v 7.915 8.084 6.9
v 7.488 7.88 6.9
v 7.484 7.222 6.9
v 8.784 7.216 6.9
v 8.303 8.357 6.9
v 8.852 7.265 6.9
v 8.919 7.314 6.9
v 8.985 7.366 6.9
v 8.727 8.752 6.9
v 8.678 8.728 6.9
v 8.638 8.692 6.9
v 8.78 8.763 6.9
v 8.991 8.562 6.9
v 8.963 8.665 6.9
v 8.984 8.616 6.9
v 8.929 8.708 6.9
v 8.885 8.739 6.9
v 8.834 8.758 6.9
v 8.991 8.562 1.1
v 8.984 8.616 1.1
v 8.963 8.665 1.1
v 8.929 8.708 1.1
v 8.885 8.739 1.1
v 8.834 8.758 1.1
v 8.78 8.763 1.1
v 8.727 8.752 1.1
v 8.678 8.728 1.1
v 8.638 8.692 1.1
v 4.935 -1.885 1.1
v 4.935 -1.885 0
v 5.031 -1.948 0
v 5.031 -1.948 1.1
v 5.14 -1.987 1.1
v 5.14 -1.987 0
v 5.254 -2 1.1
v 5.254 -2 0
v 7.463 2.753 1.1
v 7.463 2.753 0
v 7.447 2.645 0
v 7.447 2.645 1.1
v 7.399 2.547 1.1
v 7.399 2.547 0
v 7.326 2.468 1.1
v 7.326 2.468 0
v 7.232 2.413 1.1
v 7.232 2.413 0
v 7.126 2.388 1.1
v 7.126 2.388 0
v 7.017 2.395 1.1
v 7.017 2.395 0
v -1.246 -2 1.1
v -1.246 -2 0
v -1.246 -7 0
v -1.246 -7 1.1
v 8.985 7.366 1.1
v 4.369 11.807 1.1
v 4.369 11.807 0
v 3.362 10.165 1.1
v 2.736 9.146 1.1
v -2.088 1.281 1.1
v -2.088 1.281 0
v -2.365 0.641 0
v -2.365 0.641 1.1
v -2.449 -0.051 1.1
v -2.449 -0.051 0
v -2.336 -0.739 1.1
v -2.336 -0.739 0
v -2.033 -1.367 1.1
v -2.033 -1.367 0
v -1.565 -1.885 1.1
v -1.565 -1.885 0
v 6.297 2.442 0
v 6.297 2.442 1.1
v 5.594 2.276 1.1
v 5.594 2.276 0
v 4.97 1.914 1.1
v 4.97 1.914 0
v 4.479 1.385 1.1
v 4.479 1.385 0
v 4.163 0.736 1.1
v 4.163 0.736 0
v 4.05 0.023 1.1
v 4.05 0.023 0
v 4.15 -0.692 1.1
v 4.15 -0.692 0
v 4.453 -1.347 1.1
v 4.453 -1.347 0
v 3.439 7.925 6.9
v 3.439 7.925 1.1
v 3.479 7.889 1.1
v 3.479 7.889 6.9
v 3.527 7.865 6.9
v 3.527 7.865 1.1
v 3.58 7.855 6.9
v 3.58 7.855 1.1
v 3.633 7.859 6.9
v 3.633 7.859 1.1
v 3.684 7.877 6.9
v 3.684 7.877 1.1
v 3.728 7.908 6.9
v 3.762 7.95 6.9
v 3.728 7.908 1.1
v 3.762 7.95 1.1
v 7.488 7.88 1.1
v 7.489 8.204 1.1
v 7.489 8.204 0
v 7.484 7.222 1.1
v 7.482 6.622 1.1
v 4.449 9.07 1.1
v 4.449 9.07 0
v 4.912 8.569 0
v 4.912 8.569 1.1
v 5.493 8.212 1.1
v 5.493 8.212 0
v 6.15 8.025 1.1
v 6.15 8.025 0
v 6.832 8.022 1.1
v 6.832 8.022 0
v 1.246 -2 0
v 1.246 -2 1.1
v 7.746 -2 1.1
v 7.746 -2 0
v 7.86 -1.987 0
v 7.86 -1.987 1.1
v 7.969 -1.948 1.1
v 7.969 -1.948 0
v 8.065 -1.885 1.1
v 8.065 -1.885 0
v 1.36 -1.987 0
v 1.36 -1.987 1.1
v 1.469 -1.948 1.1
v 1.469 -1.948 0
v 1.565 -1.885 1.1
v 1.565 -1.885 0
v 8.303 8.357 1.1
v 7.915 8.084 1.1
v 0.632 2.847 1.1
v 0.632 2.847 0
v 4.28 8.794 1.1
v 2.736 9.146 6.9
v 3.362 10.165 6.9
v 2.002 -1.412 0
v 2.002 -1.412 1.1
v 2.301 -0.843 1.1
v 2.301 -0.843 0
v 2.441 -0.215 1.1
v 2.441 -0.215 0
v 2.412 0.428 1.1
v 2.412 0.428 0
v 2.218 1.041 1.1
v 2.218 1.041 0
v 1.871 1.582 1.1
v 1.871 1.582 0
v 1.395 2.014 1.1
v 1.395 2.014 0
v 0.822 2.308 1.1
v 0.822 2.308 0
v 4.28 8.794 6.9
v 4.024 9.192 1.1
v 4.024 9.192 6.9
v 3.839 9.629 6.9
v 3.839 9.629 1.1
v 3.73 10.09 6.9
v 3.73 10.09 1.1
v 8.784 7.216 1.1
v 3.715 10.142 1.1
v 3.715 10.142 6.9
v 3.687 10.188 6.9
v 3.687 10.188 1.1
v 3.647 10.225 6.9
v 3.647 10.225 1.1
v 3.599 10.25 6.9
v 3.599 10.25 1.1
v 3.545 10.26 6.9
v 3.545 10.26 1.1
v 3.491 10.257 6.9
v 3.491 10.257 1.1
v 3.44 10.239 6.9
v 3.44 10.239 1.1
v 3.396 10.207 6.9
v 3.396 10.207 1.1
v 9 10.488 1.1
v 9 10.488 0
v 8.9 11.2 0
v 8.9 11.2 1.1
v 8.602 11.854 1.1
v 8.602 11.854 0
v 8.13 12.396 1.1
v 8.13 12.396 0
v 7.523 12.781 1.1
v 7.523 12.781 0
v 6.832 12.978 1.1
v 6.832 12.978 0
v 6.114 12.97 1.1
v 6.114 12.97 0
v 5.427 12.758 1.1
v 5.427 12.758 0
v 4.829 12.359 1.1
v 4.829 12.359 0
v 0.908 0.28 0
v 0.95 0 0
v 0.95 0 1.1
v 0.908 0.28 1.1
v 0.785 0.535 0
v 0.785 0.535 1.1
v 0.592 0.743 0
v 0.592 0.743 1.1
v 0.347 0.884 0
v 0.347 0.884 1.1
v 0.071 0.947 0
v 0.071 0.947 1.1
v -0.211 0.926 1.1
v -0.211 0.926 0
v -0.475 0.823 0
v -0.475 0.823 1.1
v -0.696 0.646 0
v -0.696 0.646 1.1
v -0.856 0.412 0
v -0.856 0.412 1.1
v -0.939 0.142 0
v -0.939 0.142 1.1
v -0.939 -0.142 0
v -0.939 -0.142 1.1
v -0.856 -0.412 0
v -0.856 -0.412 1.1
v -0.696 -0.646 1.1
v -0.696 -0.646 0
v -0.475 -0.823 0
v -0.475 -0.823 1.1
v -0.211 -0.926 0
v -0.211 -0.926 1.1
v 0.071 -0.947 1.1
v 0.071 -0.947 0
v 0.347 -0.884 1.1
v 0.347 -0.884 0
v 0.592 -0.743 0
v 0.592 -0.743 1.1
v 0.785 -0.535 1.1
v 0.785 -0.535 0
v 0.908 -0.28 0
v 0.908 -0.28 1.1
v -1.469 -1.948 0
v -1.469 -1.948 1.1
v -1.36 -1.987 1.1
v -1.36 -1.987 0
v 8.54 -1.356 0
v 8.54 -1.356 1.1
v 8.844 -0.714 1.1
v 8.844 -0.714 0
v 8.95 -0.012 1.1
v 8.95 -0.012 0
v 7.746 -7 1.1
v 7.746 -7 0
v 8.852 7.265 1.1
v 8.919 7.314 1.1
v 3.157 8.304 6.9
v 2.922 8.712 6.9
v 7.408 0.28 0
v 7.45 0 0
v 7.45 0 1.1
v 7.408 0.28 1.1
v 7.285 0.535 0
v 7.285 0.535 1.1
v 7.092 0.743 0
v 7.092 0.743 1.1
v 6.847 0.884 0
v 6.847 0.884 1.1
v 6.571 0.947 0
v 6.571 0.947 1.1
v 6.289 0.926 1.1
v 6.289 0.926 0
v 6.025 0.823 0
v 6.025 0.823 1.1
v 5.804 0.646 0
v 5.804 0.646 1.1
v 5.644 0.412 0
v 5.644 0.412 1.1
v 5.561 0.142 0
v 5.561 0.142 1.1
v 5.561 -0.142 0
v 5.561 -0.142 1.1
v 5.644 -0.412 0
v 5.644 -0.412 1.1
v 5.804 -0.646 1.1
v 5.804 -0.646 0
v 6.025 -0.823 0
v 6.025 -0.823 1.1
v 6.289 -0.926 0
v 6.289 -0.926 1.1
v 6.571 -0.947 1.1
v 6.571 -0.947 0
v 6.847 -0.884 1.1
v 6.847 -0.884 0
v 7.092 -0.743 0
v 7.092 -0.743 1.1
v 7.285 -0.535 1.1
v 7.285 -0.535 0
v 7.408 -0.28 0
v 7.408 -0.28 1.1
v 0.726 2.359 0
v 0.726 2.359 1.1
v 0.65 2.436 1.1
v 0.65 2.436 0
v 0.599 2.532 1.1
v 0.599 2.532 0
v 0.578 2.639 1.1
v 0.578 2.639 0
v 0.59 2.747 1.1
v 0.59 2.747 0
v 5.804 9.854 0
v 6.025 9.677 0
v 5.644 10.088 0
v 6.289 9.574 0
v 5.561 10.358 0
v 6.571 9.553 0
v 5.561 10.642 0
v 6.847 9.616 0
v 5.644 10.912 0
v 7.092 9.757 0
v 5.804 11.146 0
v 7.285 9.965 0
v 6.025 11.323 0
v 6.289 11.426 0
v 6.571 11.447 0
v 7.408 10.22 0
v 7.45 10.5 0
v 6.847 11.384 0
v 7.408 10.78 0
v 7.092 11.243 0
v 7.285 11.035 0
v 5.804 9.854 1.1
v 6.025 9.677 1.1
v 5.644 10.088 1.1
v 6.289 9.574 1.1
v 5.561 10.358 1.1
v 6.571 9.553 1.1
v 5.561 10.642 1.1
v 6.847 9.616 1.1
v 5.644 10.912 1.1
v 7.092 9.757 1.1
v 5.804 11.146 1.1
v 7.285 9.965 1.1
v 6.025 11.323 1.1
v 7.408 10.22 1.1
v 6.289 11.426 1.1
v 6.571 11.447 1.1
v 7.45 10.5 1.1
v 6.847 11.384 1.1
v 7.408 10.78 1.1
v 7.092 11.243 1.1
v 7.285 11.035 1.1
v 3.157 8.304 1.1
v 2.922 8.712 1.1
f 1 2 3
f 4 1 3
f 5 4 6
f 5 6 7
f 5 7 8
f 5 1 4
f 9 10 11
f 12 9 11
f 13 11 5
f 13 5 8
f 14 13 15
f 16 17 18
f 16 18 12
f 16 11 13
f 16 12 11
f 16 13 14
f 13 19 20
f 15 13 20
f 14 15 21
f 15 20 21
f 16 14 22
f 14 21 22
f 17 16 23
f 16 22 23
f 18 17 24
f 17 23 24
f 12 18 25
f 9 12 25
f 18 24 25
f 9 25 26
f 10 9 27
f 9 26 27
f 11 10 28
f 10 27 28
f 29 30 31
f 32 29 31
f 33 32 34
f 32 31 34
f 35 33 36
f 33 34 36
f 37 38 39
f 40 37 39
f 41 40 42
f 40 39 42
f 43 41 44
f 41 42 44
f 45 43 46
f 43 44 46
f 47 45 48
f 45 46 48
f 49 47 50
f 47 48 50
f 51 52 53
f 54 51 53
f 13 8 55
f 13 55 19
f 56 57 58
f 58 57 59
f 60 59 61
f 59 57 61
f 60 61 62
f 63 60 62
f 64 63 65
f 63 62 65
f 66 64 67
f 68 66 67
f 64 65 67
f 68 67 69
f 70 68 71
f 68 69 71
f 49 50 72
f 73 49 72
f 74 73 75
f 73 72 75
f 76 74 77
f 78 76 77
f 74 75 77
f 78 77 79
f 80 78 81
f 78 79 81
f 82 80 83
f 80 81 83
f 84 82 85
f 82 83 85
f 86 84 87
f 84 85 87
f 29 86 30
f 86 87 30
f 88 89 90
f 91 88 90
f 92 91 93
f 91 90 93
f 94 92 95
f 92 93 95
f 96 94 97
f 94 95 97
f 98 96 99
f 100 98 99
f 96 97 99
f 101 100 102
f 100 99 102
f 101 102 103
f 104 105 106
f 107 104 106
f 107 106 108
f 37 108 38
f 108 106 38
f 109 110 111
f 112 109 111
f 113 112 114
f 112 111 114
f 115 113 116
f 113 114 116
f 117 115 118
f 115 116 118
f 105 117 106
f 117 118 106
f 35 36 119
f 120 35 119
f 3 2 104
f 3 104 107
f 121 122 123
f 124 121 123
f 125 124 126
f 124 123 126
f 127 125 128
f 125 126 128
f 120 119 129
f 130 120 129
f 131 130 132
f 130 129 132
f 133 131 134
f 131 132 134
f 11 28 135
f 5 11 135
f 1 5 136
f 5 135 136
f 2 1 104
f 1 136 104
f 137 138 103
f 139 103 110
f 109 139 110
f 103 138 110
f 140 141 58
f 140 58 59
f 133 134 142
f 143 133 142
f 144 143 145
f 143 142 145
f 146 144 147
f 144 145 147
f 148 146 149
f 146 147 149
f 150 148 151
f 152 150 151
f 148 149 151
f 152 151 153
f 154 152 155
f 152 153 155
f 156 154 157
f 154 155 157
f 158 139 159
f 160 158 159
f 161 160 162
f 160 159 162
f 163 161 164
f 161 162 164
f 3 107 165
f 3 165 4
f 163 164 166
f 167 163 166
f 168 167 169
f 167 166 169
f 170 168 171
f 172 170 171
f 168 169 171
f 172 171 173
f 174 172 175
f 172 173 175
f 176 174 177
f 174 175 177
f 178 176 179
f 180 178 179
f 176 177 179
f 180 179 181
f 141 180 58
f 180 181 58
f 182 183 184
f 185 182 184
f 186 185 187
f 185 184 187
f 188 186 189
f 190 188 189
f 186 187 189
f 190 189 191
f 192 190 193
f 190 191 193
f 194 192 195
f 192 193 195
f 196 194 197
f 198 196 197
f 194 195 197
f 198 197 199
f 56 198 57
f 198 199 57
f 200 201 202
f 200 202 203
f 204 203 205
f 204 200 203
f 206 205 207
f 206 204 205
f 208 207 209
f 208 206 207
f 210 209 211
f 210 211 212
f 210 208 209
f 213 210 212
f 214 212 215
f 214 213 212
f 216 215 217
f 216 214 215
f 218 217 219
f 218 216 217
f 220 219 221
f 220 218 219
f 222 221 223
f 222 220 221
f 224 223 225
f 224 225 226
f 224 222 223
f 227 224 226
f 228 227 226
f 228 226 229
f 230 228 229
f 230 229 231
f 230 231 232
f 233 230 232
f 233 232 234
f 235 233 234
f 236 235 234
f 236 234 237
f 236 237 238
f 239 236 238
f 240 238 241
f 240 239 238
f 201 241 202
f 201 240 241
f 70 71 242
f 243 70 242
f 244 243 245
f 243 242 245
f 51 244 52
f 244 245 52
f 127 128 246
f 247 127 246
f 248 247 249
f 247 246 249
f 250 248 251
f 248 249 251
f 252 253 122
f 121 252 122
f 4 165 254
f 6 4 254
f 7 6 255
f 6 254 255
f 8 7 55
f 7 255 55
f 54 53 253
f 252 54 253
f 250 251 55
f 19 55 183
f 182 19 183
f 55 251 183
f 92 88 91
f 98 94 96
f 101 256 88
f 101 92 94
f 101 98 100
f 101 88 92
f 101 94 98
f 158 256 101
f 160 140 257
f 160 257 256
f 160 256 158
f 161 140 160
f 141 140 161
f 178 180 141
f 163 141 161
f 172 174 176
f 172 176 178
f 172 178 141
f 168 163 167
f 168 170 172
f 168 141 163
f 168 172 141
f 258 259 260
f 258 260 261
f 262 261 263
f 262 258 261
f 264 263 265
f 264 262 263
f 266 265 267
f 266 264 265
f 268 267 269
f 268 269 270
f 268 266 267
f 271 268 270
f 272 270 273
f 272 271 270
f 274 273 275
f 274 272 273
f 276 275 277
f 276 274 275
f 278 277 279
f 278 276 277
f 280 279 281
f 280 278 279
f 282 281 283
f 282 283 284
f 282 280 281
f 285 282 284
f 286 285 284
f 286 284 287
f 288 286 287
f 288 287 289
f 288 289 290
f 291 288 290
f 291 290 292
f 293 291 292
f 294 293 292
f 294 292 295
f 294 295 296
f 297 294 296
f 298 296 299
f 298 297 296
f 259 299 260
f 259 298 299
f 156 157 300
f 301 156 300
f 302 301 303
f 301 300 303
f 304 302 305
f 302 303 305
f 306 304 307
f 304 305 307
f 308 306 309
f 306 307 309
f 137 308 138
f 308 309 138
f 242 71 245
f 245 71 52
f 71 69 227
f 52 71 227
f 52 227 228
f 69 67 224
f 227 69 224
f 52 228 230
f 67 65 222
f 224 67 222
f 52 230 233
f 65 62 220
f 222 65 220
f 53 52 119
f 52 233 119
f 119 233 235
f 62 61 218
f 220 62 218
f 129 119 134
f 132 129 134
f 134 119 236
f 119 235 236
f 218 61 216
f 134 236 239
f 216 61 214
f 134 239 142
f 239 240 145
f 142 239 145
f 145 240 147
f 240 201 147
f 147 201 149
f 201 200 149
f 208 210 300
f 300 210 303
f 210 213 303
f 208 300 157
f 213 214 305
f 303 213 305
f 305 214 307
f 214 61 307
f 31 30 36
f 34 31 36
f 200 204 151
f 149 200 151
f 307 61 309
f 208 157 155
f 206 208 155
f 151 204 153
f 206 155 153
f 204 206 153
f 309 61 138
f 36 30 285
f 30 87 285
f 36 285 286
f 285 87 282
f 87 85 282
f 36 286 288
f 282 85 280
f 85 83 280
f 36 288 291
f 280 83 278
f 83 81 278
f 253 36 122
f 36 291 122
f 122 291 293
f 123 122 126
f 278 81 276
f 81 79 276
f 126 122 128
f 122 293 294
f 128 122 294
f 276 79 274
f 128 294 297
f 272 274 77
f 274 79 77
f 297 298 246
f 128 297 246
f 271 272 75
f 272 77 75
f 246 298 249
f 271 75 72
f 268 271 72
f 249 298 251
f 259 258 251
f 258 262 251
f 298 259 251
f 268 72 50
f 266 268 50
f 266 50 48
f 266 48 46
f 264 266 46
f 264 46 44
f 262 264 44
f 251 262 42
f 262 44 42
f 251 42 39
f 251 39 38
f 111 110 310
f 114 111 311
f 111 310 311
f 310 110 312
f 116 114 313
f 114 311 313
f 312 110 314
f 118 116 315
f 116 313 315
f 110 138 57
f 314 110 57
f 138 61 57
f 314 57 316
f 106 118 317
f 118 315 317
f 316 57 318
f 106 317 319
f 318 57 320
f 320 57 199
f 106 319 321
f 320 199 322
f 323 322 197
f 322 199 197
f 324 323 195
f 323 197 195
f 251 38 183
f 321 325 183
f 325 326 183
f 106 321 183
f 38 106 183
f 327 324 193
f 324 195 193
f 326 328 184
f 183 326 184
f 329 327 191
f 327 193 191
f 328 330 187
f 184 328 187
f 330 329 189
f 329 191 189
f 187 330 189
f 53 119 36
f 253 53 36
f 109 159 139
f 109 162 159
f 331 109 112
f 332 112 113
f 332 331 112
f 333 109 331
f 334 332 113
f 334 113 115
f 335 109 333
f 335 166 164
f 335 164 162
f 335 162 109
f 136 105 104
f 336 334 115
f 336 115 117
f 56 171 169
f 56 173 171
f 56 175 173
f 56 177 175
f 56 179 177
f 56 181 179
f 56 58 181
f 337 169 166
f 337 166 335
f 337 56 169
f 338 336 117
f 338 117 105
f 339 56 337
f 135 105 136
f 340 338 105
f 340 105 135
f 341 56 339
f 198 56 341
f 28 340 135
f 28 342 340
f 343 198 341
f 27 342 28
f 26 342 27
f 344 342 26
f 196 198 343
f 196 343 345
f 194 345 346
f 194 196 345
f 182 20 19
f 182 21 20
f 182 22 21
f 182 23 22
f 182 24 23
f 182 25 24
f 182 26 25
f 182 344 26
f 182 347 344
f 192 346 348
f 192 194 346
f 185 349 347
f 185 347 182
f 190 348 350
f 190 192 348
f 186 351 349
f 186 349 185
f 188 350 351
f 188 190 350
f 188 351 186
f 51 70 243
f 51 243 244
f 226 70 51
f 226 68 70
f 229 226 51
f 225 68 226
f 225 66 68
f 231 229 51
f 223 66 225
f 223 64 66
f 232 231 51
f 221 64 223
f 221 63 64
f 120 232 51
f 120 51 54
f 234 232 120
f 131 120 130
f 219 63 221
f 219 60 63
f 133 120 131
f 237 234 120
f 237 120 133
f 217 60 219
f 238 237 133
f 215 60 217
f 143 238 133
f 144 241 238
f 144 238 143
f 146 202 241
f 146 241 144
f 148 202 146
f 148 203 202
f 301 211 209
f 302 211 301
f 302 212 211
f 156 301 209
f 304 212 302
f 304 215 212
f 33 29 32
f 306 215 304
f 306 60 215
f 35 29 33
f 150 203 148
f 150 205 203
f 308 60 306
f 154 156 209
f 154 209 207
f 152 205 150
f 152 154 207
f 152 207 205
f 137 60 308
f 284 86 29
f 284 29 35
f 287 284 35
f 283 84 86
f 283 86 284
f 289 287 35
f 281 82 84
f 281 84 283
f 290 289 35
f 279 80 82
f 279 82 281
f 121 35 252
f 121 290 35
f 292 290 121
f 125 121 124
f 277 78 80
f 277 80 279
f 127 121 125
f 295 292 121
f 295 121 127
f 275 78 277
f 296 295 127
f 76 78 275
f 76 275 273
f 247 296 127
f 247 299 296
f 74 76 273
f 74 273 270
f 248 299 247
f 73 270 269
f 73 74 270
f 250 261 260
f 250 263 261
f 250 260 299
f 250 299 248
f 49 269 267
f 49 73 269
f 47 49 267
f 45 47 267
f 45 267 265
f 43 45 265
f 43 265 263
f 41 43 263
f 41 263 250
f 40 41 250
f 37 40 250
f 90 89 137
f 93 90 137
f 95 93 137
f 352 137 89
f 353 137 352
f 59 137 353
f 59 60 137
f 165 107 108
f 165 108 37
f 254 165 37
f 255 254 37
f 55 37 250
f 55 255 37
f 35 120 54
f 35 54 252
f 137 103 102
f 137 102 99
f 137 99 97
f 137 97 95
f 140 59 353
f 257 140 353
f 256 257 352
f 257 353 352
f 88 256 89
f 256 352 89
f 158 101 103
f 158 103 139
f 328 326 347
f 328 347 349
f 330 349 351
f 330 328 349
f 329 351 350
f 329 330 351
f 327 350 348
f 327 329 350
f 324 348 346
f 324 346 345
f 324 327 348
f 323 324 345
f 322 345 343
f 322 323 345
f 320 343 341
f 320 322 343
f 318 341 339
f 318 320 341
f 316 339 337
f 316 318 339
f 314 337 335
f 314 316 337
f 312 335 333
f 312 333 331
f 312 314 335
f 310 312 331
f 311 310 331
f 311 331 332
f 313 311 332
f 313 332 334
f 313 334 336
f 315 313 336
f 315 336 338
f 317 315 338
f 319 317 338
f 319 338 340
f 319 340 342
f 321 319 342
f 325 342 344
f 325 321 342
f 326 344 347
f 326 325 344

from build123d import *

# Parameters (mm, degrees)
STOCK_BASE_SKEWED_1_OUTLINE_R = 0.95
STOCK_BASE_SKEWED_1_DEPTH     = 1.1
STOCK_BASE_SKEWED_1_START     = 1.1
STOCK_BASE_SKEWED_1_2_DEPTH   = 5.8
SKETCH1_W                     = 5.8
SKETCH1_H                     = 0.6
CUT_EXTRUDE1_DEPTH            = 18.76345965


# Read off the part's stored shape, not the designer's step: Stock-Base_skewed-1
with BuildPart() as part:
    # Stock-Base_skewed-1 outline → Stock-Base_skewed-1 (new body)
    with BuildSketch(Plane.XY):
        with BuildLine():
            Line((8.949972222, -0.011666667), (8.999971655, 10.488095238))
            ThreePointArc((8.999971655, 10.488095238), (7.184905048, 12.904351279), (4.369026688, 11.807269193))
            Line((4.369026688, 11.807269193), (-2.088353846, 1.281123809))
            ThreePointArc((-2.088353846, 1.281123809), (-2.417250501, -0.399249317), (-1.565479113, -1.884615385))
            ThreePointArc((-1.565479113, -1.884615385), (-1.415835135, -1.970269972), (-1.245993579, -2))
            Line((-1.245993579, -2), (-1.245993579, -7))
            Line((-1.245993579, -7), (7.745993579, -7))
            Line((7.745993579, -7), (7.745993579, -2))
            ThreePointArc((7.745993579, -2), (7.915835135, -1.970269972), (8.065479113, -1.884615385))
            ThreePointArc((8.065479113, -1.884615385), (8.715388585, -1.046209071), (8.949972222, -0.011666667))
        make_face()
        with BuildLine():
            ThreePointArc((7.463119607, 2.75282442), (7.325518036, 2.467571215), (7.017292273, 2.394766941))
            ThreePointArc((7.017292273, 2.394766941), (4.297058288, 1.072169676), (4.934520887, -1.884615385))
            ThreePointArc((4.934520887, -1.884615385), (5.084164865, -1.970269972), (5.254006421, -2))
            Line((5.254006421, -2), (1.245993579, -2))
            ThreePointArc((1.245993579, -2), (1.415835135, -1.970269972), (1.565479113, -1.884615385))
            ThreePointArc((1.565479113, -1.884615385), (2.412392059, 0.427626653), (0.822306837, 2.307880297))
            ThreePointArc((0.822306837, 2.307880297), (0.598713954, 2.532178772), (0.632085047, 2.847123137))
            Line((0.632085047, 2.847123137), (4.449478669, 9.069838376))
            ThreePointArc((4.449478669, 9.069838376), (5.815094952, 8.095648721), (7.489077768, 8.203976226))
            Line((7.489077768, 8.203976226), (7.463119607, 2.75282442))
        make_face(mode=Mode.SUBTRACT)
        Circle(STOCK_BASE_SKEWED_1_OUTLINE_R, mode=Mode.SUBTRACT)
        with Locations((6.5, 0)):
            Circle(STOCK_BASE_SKEWED_1_OUTLINE_R, mode=Mode.SUBTRACT)
        with Locations((6.5, 10.5)):
            Circle(STOCK_BASE_SKEWED_1_OUTLINE_R, mode=Mode.SUBTRACT)
    extrude(amount=STOCK_BASE_SKEWED_1_DEPTH)

    # Stock-Base_skewed-1 2 outline → Stock-Base_skewed-1 2 (add)
    with BuildSketch(Plane.XY.offset(STOCK_BASE_SKEWED_1_START)):
        with BuildLine():
            Line((7.487534665, 7.879928382), (7.481545884, 6.622298661))
            ThreePointArc((7.481545884, 6.622298661), (8.272723591, 6.914271194), (8.985102612, 7.365631642))
            Line((8.985102612, 7.365631642), (8.990799579, 8.561981048))
            ThreePointArc((8.990799579, 8.561981048), (8.86000918, 8.750577627), (8.638081723, 8.6920712))
            ThreePointArc((8.638081723, 8.6920712), (8.114702276, 8.212482446), (7.487534665, 7.879928382))
        make_face()
        with BuildLine():
            Line((3.762240232, 7.94957426), (4.280029642, 8.793620321))
            ThreePointArc((4.280029642, 8.793620321), (3.922249334, 9.406747282), (3.73015902, 10.090145211))
            ThreePointArc((3.73015902, 10.090145211), (3.572375767, 10.256816274), (3.361835371, 10.165451404))
            Line((3.361835371, 10.165451404), (2.736247989, 9.14568438))
            ThreePointArc((2.736247989, 9.14568438), (3.033358957, 8.50440488), (3.438697229, 7.925427153))
            ThreePointArc((3.438697229, 7.925427153), (3.606647644, 7.854710493), (3.762240232, 7.94957426))
        make_face()
    extrude(amount=STOCK_BASE_SKEWED_1_2_DEPTH)

    # Sketch1 → Cut-Extrude1 (cut, through all)
    with BuildSketch(Plane(origin=(7.449841837, -0.03547584, 0), x_dir=(0, 0, 1), z_dir=(-0.999988662067245, 0.004761904761905177, 0))):
        with Locations((4, 6.957849986)):
            Rectangle(SKETCH1_W, SKETCH1_H)
    extrude(amount=-CUT_EXTRUDE1_DEPTH, mode=Mode.SUBTRACT)


solid = part.part
